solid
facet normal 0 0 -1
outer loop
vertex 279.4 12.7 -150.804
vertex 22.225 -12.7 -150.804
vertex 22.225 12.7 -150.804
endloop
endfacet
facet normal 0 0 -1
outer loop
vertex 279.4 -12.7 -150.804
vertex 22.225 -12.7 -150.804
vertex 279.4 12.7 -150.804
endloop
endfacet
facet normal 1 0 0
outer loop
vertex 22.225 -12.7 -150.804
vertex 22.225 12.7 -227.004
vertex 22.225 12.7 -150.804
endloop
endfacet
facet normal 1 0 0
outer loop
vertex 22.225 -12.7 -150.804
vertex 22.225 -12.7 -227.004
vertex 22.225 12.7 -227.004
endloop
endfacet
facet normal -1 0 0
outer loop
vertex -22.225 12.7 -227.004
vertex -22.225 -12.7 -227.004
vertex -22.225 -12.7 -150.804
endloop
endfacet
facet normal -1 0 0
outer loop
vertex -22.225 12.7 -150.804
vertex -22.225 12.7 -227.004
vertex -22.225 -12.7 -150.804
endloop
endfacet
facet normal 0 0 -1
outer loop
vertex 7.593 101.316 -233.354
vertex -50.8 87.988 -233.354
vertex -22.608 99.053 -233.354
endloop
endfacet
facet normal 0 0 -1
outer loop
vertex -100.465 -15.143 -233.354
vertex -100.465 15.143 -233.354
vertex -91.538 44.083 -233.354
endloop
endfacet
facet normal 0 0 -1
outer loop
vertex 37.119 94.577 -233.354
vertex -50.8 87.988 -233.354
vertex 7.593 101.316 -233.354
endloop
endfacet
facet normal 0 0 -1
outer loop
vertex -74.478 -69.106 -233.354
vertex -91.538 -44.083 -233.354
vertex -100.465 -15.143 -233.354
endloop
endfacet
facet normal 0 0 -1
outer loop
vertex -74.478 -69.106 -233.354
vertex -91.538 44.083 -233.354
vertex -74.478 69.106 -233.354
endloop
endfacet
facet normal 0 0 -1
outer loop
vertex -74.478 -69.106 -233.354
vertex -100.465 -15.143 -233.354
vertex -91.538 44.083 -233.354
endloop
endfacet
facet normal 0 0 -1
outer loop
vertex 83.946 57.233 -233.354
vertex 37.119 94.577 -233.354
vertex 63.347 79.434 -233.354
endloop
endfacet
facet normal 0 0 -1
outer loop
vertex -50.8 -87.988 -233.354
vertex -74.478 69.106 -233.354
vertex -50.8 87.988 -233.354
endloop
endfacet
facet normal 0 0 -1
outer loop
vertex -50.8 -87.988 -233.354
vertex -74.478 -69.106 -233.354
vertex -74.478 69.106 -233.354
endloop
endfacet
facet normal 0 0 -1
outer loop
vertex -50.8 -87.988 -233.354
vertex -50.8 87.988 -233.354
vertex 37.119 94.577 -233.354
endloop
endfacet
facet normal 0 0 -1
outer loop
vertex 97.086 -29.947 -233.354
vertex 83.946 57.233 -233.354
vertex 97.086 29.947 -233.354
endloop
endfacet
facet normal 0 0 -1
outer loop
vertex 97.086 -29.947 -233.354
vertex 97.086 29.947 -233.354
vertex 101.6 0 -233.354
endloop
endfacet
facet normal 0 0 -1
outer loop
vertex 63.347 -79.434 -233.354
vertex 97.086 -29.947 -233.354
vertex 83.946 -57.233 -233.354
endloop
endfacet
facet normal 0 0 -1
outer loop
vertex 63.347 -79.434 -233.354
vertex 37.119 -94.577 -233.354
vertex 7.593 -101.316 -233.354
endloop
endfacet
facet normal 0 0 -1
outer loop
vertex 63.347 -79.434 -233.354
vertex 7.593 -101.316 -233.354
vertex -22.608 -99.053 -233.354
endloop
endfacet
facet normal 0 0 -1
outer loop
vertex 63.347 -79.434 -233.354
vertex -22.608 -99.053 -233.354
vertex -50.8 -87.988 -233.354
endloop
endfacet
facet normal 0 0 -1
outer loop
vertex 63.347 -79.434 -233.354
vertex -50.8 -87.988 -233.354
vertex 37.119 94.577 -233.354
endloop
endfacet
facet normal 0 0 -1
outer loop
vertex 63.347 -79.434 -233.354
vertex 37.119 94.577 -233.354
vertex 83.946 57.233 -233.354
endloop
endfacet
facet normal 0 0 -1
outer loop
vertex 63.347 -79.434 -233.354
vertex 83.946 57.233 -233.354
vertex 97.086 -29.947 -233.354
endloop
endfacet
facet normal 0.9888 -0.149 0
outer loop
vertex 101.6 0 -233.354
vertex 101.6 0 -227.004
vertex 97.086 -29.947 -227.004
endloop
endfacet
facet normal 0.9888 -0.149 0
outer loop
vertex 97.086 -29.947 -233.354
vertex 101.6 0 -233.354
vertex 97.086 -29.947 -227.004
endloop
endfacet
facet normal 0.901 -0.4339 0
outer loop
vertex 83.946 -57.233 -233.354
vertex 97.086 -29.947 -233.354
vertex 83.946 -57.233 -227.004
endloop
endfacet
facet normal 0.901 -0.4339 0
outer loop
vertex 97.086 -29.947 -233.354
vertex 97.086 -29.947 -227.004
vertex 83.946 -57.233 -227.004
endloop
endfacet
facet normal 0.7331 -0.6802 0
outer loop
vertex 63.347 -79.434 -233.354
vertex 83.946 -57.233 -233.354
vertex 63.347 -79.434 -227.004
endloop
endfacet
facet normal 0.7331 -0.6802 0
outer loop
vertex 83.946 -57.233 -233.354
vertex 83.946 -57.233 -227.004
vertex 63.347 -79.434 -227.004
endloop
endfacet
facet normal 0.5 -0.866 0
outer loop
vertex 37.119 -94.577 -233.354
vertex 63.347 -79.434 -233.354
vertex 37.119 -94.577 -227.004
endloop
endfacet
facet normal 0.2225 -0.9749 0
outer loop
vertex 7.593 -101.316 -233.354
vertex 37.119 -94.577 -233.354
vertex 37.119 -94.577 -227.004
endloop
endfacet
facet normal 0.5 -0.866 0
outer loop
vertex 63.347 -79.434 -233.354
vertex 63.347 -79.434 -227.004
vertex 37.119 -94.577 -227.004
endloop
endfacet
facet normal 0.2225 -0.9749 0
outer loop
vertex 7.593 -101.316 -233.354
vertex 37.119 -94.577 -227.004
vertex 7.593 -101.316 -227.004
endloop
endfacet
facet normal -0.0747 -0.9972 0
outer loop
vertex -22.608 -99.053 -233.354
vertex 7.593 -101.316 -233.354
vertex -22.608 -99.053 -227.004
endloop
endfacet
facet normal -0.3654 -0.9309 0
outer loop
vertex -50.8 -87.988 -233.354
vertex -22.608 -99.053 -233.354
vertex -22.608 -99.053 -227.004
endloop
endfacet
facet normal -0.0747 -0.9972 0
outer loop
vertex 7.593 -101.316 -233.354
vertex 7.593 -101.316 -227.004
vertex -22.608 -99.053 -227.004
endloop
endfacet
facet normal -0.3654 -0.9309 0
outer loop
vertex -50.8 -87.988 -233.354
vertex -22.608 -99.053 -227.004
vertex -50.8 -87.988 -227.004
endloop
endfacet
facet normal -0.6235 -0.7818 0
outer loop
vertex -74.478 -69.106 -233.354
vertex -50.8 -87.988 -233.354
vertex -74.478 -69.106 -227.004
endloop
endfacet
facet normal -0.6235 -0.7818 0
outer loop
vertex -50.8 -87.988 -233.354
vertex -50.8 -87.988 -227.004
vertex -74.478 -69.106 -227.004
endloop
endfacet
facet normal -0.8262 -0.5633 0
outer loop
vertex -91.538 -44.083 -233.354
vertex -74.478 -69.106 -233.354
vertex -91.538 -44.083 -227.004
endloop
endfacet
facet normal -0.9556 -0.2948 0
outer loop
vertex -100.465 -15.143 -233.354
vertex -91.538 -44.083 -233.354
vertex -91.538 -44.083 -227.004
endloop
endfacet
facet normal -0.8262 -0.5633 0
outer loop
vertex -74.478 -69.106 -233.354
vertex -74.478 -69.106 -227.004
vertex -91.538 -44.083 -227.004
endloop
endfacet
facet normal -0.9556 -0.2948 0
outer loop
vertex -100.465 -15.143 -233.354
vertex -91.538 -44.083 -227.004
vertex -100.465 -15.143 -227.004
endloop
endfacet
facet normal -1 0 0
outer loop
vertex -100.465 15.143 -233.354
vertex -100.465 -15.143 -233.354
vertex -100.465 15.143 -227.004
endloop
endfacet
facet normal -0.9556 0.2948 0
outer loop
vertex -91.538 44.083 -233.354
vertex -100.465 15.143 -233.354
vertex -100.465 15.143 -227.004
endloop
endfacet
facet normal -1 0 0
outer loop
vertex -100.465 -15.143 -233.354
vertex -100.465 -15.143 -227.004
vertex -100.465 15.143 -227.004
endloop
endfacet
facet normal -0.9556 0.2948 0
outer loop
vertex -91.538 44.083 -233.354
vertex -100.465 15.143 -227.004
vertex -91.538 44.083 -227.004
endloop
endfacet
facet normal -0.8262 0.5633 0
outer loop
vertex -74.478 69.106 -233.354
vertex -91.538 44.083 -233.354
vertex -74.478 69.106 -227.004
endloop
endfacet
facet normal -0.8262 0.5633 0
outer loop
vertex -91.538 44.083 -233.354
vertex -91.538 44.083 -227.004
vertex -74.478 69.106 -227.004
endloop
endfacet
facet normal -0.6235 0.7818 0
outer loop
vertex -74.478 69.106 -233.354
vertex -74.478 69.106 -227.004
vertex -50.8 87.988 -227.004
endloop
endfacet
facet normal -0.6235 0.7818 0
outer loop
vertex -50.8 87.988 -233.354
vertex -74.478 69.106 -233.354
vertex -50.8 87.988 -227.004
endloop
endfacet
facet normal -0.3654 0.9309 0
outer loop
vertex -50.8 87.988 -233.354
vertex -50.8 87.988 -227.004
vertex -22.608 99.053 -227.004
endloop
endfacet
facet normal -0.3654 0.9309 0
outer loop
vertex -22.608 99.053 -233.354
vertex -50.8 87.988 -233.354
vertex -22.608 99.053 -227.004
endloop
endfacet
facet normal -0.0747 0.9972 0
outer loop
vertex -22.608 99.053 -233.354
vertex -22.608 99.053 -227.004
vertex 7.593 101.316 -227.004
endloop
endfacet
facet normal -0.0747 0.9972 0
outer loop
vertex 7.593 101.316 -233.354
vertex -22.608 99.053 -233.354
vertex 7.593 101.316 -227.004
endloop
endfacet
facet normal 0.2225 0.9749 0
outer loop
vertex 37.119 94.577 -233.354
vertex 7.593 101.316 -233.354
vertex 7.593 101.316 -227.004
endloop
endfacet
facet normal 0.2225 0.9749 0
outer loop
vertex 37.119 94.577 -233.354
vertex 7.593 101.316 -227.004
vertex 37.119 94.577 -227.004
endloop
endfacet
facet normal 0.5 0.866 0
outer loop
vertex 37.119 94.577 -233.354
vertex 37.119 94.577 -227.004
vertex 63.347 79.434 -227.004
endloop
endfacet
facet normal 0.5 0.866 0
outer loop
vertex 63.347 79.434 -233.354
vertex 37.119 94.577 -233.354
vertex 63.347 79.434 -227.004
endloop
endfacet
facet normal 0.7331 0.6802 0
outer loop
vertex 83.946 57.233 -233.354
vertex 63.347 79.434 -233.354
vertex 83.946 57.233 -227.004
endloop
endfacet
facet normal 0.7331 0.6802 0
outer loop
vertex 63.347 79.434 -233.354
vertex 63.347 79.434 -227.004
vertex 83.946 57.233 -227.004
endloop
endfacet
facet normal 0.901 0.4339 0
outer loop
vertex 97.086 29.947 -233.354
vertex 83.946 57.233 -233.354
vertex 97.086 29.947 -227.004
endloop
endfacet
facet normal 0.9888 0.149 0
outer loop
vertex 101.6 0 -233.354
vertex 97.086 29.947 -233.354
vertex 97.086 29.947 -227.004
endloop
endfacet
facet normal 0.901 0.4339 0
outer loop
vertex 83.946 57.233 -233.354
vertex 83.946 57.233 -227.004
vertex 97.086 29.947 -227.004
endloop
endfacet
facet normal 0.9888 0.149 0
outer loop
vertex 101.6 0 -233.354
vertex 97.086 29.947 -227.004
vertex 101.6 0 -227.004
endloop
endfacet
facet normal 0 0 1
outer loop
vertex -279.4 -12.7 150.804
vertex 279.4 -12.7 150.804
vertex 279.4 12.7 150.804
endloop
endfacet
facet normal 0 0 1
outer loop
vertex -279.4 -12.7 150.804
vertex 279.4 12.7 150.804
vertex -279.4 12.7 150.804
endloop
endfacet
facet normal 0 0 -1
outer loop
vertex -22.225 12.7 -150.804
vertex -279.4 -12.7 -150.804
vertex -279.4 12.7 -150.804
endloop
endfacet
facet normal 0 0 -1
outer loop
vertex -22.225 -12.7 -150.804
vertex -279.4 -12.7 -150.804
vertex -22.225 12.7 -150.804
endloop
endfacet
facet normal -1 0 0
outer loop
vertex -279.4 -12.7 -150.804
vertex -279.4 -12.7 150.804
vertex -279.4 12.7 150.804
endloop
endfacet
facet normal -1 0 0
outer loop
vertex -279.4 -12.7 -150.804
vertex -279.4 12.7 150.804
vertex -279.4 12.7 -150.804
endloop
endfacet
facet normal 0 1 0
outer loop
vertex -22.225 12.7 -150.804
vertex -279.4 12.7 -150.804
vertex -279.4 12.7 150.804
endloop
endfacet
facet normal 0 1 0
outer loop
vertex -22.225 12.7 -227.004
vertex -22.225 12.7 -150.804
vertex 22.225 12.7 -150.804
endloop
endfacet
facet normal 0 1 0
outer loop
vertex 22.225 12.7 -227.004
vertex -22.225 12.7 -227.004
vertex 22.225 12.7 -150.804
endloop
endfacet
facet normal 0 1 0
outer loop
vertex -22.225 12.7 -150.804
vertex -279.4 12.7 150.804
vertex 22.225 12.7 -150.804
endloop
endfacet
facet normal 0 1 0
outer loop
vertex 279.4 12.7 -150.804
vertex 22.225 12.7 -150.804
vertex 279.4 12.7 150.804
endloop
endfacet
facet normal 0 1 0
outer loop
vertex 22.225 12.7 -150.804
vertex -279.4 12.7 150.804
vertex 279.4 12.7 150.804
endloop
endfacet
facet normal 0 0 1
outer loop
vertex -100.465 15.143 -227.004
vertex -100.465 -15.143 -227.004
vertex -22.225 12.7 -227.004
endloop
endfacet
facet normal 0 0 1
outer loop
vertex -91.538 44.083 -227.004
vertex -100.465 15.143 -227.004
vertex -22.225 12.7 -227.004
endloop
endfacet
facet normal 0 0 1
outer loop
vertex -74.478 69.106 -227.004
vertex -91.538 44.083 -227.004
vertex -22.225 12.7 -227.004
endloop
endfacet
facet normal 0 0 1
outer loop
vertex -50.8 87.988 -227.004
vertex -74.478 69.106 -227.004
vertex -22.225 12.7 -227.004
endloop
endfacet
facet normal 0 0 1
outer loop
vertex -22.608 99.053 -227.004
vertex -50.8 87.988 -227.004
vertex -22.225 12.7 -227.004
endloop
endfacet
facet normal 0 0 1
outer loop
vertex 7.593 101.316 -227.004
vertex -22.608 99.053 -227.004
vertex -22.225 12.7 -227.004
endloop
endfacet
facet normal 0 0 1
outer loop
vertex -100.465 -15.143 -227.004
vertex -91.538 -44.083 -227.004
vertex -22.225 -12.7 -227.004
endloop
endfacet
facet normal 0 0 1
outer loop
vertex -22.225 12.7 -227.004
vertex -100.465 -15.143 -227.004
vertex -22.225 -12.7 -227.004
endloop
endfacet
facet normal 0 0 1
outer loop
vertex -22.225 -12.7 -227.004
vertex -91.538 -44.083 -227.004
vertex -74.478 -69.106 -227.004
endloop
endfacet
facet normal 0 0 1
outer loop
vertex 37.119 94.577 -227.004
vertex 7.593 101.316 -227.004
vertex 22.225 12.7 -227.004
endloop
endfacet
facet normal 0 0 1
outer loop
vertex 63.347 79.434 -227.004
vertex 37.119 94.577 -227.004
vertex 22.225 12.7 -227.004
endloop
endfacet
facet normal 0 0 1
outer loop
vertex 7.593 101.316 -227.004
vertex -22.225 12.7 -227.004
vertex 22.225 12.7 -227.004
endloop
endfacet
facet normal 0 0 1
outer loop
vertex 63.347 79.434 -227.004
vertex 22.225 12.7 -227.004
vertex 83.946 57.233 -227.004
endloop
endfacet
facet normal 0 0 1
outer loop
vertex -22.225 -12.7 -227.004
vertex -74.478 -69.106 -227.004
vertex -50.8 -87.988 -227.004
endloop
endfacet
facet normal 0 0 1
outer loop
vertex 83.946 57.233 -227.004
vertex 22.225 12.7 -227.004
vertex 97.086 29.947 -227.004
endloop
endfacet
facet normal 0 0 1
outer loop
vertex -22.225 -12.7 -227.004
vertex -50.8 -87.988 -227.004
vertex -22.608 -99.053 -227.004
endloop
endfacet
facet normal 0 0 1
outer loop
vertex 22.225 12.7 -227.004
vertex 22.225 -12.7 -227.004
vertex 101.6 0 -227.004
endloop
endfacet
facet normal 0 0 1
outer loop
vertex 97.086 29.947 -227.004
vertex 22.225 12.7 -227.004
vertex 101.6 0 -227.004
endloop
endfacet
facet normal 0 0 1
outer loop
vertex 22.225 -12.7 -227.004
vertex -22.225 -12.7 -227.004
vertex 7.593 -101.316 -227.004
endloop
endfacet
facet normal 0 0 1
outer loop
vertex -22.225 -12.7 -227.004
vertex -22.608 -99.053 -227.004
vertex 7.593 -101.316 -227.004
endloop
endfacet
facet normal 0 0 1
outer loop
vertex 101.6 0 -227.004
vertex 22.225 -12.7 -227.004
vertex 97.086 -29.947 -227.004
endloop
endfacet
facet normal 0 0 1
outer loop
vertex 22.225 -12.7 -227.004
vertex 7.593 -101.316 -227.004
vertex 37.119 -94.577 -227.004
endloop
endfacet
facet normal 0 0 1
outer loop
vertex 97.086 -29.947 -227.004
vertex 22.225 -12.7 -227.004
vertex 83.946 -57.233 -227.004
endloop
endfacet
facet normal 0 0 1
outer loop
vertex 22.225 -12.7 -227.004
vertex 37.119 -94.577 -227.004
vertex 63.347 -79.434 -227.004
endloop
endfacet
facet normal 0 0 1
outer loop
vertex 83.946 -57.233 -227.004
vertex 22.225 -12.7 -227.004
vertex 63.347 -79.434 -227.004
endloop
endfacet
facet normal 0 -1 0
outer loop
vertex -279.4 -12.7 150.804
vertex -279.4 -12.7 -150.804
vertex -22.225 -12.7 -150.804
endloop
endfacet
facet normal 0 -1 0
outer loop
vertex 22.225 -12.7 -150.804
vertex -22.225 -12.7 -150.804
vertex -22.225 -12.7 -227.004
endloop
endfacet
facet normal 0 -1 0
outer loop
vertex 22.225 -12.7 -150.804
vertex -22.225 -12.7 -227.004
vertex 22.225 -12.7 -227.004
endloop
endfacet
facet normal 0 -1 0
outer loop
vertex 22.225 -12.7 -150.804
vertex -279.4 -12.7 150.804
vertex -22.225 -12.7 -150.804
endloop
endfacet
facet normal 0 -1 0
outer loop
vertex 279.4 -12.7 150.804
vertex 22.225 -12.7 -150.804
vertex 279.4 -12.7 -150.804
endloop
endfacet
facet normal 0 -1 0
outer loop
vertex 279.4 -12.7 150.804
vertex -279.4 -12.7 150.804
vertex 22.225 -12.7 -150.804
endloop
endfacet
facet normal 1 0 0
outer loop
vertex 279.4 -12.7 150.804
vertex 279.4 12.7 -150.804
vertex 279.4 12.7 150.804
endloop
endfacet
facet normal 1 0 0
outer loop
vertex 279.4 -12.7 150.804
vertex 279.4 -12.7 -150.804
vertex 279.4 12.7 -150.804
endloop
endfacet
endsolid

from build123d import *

# Parameters (mm, degrees)
F0_W     = 44.45
F0_H     = 76.2
F1_DEPTH = 12.7
F2_R     = 101.6
F3_DEPTH = 6.35


with BuildPart() as f1:
    # F0 (on Front) → F1 (new body, symmetric)
    with BuildSketch(Plane.XZ):
        Polygon((279.4, -150.804145), (279.4, 150.804145), (-279.4, 150.804145), align=None)
        Polygon((279.4, -150.804145), (-279.4, 150.804145), (-279.4, -150.804145), (-22.225, -150.804145), (22.225, -150.804145), align=None)
        with Locations((0, -188.904145)):
            Rectangle(F0_W, F0_H)
    extrude(amount=F1_DEPTH, both=True)

    # F2 (on face) → F3 (join)
    with BuildSketch(Plane(origin=(0, 0, -227.004145), x_dir=(1, 0, 0), z_dir=(0, 0, -1))):
        Circle(F2_R)
    extrude(amount=F3_DEPTH)


solid = f1.part
